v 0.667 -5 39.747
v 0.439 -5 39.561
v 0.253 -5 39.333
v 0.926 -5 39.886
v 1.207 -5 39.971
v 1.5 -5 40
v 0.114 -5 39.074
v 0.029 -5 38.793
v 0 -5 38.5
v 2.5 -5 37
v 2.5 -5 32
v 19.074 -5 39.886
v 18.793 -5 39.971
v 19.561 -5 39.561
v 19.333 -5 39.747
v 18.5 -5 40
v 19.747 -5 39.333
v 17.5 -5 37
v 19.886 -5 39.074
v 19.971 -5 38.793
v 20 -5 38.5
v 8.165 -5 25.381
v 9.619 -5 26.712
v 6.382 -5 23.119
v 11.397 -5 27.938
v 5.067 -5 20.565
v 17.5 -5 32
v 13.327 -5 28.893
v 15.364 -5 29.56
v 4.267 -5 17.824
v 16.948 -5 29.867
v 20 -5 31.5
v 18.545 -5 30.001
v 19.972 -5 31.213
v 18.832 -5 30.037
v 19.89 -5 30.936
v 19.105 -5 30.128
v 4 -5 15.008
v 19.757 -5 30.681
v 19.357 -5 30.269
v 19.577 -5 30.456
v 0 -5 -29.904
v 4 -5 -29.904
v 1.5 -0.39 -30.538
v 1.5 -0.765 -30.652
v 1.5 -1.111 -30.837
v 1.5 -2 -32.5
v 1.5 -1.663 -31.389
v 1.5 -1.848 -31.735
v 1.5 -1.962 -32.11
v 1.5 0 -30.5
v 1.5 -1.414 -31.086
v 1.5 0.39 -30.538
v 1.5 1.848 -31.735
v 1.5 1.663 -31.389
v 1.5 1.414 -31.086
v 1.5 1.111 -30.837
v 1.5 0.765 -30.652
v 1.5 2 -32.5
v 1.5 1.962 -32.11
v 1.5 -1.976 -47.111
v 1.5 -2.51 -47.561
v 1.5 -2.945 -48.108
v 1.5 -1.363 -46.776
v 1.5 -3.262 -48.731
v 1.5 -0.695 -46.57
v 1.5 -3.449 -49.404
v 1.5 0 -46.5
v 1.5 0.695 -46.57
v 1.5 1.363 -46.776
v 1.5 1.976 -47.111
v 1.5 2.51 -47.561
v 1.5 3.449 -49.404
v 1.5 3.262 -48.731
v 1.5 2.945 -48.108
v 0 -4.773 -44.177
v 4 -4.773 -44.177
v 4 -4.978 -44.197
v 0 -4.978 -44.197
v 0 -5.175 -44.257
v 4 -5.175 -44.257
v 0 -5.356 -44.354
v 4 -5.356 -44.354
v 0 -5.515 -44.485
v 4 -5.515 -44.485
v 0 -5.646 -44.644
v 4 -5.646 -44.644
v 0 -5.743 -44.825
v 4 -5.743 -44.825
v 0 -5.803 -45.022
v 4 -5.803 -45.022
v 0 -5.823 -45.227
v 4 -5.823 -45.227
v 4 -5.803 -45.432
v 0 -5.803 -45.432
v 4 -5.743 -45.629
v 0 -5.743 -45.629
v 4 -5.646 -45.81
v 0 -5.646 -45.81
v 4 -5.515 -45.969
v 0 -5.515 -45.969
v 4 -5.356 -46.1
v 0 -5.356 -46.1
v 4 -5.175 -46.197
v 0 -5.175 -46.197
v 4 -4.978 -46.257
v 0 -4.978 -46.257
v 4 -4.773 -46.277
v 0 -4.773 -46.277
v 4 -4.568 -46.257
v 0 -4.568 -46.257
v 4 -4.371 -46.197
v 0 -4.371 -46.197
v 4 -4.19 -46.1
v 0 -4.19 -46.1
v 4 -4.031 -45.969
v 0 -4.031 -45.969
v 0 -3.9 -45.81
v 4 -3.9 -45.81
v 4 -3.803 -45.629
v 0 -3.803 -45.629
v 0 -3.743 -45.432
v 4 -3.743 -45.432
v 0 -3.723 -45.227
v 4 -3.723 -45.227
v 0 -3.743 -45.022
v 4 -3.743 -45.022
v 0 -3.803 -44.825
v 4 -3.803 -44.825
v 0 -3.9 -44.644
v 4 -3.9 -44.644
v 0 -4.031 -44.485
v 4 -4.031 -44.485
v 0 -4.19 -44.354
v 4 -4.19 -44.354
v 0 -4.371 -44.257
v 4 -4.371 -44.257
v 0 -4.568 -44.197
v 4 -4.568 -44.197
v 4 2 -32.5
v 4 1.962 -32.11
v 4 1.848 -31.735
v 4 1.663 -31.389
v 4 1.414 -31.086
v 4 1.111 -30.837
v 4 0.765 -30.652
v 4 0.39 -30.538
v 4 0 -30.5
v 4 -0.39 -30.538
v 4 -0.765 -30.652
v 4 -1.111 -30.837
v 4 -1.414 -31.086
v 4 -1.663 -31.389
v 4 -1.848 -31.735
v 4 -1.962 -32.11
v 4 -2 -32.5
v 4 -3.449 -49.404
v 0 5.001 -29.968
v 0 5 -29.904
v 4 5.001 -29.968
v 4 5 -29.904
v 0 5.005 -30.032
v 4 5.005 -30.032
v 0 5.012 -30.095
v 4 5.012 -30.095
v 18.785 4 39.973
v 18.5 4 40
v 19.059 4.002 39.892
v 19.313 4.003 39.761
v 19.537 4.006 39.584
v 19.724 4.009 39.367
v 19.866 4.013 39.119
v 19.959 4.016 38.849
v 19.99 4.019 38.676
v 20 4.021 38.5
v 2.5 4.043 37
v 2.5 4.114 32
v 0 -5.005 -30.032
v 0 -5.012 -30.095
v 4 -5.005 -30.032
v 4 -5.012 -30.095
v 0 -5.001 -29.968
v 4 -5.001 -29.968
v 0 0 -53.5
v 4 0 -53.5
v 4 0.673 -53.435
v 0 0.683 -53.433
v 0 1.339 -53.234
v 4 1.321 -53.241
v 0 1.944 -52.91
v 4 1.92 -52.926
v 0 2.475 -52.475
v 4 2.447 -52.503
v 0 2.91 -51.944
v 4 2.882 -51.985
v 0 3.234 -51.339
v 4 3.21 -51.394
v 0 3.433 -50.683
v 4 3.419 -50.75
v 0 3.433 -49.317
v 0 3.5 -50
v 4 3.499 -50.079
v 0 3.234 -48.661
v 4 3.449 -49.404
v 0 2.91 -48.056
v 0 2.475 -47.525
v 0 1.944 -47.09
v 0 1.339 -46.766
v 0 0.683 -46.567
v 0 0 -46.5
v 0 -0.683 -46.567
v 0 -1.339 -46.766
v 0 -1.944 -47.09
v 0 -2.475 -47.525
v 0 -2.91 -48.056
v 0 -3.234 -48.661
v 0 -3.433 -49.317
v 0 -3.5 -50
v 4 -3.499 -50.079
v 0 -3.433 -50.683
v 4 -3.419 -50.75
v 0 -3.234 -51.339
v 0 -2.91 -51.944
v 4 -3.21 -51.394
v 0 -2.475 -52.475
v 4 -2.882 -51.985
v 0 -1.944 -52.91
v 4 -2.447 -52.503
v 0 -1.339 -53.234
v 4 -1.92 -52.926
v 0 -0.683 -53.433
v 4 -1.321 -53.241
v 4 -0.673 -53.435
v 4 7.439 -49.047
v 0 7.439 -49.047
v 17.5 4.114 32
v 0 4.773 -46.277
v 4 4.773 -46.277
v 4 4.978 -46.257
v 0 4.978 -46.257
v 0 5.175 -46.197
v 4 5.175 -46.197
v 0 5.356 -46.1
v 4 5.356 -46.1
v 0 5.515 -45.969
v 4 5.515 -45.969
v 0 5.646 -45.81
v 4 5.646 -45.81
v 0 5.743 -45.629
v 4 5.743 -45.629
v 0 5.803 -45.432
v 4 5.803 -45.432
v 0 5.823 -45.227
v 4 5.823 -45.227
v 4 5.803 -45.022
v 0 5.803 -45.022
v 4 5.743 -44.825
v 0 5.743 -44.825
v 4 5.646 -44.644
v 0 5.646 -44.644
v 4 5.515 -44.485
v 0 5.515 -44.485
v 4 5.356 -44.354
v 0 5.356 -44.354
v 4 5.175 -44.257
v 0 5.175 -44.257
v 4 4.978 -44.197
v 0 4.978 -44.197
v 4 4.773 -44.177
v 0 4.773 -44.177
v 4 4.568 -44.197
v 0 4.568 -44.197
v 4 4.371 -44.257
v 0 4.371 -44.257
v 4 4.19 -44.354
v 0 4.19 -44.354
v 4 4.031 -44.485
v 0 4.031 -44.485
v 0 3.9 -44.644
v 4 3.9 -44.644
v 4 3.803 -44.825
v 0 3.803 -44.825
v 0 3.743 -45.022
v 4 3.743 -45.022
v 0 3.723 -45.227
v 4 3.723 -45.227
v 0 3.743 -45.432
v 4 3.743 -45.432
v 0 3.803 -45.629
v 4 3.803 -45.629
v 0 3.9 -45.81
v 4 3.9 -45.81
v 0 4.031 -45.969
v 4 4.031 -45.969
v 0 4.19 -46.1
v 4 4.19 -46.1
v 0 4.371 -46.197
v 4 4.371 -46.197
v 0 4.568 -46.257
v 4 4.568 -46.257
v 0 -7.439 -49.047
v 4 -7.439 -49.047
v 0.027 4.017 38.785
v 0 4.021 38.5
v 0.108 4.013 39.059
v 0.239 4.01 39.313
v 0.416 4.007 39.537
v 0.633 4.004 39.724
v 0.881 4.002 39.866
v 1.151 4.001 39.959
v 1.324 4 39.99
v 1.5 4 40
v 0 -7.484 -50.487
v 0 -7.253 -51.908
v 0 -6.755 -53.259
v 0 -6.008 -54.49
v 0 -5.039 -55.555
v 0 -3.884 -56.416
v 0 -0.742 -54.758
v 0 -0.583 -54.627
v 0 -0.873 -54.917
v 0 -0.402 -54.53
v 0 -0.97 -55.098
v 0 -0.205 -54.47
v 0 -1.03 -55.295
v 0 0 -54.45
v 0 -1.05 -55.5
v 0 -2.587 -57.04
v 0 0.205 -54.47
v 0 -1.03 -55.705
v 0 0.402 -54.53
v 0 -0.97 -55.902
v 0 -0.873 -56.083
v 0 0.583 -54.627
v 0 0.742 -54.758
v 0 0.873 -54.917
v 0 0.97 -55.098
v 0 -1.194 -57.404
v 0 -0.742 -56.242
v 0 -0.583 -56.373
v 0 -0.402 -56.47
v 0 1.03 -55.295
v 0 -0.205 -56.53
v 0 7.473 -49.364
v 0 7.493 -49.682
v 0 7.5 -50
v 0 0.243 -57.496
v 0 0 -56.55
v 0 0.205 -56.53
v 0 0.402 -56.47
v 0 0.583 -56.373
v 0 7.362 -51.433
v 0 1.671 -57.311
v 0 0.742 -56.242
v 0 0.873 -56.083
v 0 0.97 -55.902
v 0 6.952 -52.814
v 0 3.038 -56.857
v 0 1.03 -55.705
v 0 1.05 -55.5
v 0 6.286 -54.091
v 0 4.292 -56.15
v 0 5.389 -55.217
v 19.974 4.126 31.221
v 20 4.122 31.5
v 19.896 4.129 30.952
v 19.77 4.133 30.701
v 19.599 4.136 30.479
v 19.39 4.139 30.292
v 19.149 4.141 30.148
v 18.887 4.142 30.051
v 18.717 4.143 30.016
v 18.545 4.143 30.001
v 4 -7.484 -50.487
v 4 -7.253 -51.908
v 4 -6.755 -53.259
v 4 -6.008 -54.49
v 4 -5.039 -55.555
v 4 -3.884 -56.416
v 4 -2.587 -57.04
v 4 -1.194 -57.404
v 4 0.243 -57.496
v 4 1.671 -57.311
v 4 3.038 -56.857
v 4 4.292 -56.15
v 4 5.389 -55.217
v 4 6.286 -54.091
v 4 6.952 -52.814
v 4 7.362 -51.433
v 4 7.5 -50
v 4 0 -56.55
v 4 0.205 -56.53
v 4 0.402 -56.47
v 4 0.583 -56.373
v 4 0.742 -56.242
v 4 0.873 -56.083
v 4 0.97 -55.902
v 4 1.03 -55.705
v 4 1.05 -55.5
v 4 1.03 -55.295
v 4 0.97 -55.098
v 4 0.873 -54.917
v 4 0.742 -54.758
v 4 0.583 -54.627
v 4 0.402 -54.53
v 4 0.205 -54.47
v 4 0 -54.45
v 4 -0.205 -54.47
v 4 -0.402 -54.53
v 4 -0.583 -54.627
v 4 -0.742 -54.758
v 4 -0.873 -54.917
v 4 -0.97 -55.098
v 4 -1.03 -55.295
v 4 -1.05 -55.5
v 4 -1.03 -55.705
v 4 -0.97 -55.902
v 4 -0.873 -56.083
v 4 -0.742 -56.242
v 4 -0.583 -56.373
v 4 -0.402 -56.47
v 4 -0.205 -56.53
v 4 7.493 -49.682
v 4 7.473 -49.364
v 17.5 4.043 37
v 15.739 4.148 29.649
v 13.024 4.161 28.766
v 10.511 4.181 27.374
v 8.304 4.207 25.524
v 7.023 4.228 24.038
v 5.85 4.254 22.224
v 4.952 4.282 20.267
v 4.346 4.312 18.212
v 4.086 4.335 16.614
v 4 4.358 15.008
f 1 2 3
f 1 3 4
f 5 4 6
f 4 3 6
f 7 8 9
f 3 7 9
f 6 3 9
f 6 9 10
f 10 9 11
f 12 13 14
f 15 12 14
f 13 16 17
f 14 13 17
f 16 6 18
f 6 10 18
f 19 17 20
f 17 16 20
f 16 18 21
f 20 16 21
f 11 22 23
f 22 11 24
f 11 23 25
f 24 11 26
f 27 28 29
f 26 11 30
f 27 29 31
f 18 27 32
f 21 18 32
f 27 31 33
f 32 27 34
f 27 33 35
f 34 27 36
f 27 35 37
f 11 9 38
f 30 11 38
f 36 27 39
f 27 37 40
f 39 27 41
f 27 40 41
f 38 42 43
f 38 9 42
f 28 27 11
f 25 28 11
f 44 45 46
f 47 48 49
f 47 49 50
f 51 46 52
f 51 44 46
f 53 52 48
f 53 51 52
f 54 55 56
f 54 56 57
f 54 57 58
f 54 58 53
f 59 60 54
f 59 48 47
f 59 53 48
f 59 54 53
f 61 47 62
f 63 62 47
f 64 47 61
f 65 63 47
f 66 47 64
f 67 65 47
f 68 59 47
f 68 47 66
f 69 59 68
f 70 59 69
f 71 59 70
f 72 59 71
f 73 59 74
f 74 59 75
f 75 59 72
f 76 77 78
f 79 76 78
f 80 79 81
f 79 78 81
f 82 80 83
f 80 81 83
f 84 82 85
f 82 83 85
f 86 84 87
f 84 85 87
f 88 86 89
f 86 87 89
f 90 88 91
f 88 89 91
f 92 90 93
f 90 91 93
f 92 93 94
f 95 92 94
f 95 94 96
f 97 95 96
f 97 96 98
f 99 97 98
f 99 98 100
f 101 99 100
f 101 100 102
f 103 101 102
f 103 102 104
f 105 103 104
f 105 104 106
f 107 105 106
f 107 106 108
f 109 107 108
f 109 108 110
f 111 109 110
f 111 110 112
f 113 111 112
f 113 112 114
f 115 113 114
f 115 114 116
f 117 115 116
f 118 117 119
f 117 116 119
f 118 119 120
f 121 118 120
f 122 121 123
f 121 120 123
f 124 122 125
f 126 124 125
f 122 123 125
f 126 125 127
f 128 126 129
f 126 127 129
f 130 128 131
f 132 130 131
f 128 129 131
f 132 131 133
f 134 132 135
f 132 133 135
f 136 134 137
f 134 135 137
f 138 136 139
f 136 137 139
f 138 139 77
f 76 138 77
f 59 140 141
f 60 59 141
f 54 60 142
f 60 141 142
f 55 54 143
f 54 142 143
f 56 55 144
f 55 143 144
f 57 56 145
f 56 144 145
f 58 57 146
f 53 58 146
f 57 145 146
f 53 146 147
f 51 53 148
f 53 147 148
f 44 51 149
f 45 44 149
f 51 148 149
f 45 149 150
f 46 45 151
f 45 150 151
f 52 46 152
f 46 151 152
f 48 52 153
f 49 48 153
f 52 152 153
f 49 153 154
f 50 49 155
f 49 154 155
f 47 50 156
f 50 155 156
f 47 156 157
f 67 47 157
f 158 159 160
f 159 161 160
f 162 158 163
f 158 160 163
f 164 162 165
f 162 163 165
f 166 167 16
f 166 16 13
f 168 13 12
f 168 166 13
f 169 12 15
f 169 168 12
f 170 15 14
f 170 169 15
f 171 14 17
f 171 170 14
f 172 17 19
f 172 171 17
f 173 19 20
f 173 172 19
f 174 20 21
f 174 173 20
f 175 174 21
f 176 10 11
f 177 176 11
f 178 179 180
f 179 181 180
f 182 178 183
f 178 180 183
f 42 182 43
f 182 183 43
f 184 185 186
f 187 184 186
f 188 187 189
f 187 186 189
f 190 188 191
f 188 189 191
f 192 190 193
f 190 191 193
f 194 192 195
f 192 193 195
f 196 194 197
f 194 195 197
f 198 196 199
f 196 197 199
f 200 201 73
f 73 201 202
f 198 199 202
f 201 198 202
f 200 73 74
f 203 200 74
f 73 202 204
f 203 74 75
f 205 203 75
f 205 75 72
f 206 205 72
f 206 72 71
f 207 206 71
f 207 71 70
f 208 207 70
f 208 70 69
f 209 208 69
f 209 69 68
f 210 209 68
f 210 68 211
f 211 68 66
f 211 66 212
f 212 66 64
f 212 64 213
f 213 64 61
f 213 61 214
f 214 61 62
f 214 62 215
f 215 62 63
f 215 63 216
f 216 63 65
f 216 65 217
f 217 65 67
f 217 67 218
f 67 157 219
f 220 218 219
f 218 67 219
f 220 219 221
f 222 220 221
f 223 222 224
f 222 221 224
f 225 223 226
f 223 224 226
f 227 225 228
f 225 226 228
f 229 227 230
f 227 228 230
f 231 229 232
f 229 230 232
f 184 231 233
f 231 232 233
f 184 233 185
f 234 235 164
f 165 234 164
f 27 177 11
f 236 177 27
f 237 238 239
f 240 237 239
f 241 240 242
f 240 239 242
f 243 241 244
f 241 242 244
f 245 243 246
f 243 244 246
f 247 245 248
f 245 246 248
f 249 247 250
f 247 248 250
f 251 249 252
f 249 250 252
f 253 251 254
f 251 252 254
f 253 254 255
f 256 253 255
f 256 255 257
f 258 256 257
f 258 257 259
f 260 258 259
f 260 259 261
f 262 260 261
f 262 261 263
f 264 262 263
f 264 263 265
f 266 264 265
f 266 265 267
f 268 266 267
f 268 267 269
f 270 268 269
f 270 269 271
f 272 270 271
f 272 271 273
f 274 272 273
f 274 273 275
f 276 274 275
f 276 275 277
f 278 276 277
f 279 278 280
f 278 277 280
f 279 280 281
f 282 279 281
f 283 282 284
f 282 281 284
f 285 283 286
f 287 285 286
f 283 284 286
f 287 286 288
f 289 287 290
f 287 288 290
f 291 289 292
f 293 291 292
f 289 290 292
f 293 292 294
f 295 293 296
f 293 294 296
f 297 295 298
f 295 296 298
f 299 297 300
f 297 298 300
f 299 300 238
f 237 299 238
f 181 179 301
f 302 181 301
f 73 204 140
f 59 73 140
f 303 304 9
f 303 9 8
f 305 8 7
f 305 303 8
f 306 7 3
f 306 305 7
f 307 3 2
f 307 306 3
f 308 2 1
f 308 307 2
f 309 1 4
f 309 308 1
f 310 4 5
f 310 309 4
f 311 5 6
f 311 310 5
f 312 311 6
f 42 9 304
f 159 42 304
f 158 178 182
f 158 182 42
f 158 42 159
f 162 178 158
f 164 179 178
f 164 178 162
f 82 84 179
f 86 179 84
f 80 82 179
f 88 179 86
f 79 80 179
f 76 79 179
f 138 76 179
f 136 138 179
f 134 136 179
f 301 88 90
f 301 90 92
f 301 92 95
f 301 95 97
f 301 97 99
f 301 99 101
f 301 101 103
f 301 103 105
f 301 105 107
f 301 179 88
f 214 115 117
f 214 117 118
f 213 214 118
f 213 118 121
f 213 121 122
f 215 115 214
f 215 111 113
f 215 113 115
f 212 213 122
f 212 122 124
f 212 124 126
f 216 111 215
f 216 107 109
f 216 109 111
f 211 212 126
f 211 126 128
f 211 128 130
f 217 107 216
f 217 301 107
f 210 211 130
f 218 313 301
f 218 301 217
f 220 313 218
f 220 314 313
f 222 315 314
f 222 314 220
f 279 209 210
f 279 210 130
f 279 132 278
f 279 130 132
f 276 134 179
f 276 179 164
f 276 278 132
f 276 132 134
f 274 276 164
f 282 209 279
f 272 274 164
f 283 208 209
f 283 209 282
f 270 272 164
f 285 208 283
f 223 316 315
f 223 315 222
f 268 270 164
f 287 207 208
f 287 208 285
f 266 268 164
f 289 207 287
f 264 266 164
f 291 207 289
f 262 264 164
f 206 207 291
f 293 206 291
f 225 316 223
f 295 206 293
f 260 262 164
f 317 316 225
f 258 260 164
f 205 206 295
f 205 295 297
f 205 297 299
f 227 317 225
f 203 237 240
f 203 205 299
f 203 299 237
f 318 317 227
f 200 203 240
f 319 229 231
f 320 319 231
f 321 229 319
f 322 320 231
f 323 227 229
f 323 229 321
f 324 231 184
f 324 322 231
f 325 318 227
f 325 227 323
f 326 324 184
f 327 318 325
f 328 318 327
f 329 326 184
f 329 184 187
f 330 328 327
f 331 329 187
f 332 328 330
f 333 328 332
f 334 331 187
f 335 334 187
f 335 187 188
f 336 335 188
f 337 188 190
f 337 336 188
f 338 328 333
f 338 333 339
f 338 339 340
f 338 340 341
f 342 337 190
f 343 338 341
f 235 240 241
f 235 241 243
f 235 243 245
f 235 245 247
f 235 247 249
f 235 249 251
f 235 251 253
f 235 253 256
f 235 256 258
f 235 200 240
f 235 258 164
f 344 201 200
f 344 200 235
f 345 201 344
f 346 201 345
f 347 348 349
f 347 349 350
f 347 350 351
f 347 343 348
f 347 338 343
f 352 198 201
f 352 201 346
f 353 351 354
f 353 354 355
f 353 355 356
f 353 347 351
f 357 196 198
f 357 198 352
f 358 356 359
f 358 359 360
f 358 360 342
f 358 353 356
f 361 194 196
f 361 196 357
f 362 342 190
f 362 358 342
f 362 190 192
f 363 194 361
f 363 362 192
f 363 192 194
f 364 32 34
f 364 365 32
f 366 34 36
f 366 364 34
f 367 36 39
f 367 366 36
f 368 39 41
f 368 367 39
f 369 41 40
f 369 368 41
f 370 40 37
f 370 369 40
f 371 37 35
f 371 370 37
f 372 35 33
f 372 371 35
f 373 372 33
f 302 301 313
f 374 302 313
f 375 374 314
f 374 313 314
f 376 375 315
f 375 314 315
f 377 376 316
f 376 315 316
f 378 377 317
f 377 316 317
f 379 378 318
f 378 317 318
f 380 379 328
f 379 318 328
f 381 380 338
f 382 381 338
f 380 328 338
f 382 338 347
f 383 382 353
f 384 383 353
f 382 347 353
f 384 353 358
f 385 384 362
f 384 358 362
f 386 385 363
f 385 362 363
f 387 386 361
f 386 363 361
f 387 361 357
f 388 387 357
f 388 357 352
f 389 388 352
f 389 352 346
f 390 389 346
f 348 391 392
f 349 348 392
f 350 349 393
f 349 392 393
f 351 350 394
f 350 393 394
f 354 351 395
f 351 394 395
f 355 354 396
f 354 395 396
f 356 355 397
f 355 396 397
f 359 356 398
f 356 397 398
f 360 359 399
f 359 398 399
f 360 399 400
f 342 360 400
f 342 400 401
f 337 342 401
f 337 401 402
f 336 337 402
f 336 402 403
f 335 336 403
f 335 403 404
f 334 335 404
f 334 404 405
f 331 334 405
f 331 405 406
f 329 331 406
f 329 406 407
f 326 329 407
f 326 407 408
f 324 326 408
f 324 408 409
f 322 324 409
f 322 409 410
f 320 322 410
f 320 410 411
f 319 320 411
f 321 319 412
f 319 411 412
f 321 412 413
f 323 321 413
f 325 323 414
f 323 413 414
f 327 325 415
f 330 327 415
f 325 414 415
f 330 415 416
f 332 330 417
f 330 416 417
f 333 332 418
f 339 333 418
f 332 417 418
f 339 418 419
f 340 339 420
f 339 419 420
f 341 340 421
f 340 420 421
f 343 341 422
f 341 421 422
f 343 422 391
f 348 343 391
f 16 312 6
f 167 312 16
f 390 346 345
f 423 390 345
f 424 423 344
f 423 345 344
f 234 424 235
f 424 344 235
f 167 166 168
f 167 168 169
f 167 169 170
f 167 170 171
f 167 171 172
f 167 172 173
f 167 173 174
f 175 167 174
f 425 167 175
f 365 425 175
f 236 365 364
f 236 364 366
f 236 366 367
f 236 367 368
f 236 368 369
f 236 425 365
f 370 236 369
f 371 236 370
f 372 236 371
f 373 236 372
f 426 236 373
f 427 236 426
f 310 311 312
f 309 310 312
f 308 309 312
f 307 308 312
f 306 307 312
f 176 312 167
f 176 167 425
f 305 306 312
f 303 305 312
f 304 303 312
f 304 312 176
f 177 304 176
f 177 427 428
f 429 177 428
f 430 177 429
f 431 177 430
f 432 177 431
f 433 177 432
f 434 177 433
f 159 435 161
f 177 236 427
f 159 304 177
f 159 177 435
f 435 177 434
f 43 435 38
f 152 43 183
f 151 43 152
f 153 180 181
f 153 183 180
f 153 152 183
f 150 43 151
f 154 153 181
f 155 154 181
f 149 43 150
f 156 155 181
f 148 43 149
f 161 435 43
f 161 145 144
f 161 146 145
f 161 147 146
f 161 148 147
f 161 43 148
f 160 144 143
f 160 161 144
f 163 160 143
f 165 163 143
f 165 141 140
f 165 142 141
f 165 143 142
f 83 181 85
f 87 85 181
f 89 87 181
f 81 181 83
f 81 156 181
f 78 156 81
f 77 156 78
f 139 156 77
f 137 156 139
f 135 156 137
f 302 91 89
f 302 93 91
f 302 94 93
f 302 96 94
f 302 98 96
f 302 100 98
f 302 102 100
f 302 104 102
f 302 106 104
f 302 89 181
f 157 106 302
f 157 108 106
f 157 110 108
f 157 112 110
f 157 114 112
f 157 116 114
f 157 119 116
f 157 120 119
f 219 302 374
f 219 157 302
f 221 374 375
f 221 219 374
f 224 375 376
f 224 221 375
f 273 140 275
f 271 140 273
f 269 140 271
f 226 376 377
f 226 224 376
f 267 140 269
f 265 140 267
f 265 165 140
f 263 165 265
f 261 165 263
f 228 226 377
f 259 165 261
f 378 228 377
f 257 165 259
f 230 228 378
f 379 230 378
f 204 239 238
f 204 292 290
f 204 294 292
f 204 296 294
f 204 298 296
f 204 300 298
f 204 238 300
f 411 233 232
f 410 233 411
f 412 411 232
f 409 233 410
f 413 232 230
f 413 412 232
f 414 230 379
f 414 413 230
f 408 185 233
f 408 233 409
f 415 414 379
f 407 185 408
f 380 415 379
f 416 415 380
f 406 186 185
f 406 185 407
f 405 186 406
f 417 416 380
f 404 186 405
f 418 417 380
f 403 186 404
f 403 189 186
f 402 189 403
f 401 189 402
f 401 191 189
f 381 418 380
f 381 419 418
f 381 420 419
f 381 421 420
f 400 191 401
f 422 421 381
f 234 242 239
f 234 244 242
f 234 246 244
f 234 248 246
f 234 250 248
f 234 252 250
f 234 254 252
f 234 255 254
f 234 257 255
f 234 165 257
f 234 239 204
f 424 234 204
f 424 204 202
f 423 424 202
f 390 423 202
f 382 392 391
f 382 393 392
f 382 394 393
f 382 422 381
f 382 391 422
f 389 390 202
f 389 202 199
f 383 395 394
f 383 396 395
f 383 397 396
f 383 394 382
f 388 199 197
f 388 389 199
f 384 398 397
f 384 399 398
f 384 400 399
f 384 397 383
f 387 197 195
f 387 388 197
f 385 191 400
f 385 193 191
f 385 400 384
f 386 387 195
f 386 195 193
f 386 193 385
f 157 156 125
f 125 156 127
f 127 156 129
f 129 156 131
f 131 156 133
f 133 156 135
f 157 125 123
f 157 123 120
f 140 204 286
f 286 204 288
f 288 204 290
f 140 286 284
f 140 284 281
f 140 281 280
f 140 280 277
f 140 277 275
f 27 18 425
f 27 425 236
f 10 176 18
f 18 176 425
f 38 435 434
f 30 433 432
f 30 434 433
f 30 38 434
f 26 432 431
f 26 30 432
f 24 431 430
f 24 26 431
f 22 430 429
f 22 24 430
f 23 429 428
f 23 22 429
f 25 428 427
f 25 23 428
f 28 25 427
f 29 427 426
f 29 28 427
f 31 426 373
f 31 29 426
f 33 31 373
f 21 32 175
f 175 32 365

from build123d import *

# Parameters (mm, degrees)
BOSS_EXTRU_1_DEPTH      = 4
ESQUISSE2_R             = 3.5
ENL_V_MAT_EXTRU_1_DEPTH = 10
ENL_V_MAT_EXTRU_2_DEPTH = 2.5
ESQUISSE5_R             = 1.05
ENL_V_MAT_EXTRU_3_DEPTH = 59.124865591
ESQUISSE6_W             = 20
ESQUISSE6_H             = 10
BOSS_EXTRU_2_DEPTH      = 10
ESQUISSE7_W             = 15
ESQUISSE7_H             = 5
ENL_V_MAT_EXTRU_4_DEPTH = 10
CONG_2_R                = 1.5
CONG_3_R                = 15
ENL_V_START             = -20
ENL_V_MAT_EXTRU_5_DEPTH = 20


# Read off the part's stored shape, not the designer's step: Enlèv. mat.-Extru.5
with BuildPart() as part:
    # Esquisse1 → Boss.-Extru.1 (new body)
    with BuildSketch(Plane(origin=(0, 0, 0), x_dir=(0, 0, -1), z_dir=(1, 0, 0))):
        with BuildLine():
            Line((30, 5), (-30, 5))
            Line((-30, 5), (-30, -5))
            Line((-30, -5), (30, -5))
            Line((30, -5), (49.047311562, -7.439246248))
            ThreePointArc((49.047311562, -7.439246248), (57.484796152, -0.477311816), (50, 7.5))
            ThreePointArc((50, 7.5), (49.522688184, 7.484796152), (49.047311562, 7.439246248))
            Line((49.047311562, 7.439246248), (30, 5))
        make_face()
    extrude(amount=BOSS_EXTRU_1_DEPTH)

    # Esquisse2 → Enlèv. mat.-Extru.1 (cut)
    with BuildSketch(Plane(origin=(4, 0, 0), x_dir=(0, 0, -1), z_dir=(1, 0, 0))):
        with Locations((50, 0)):
            Circle(ESQUISSE2_R)
    extrude(amount=-ENL_V_MAT_EXTRU_1_DEPTH, mode=Mode.SUBTRACT)

    # Esquisse3 → Enlèv. mat.-Extru.2 (cut)
    with BuildSketch(Plane(origin=(4, 0, 0), x_dir=(0, 0, -1), z_dir=(1, 0, 0))):
        with BuildLine():
            Line((49.404376013, 3.448946515), (32.5, 2))
            ThreePointArc((32.5, 2), (30.5, 0), (32.5, -2))
            Line((32.5, -2), (49.404376013, -3.448946515))
            ThreePointArc((49.404376013, -3.448946515), (46.5, 0), (49.404376013, 3.448946515))
        make_face()
    extrude(amount=-ENL_V_MAT_EXTRU_2_DEPTH, mode=Mode.SUBTRACT)

    # Esquisse5 → Enlèv. mat.-Extru.3 (cut, through all)
    with BuildSketch(Plane(origin=(4, 0, 0), x_dir=(0, 0, -1), z_dir=(1, 0, 0))):
        with Locations((55.5, 0)):
            Circle(ESQUISSE5_R)
        with Locations((45.227029227, 4.772970773)):
            Circle(ESQUISSE5_R)
        with Locations(Location((45.227029227, -4.772970773, 0), (0, 0, 180))):
            Circle(ESQUISSE5_R)
    extrude(amount=-ENL_V_MAT_EXTRU_3_DEPTH, mode=Mode.SUBTRACT)

    # Esquisse6 → Boss.-Extru.2 (add)
    with BuildSketch(Plane.XY.offset(30)):
        with Locations((10, 0)):
            Rectangle(ESQUISSE6_W, ESQUISSE6_H)
    extrude(amount=BOSS_EXTRU_2_DEPTH)

    # Esquisse7 → Enlèv. mat.-Extru.4 (cut)
    with BuildSketch(Plane(origin=(0, 5, 0), x_dir=(1, 0, 0), z_dir=(0, 1, 0))):
        with Locations((10, -34.5)):
            Rectangle(ESQUISSE7_W, ESQUISSE7_H)
    extrude(amount=-ENL_V_MAT_EXTRU_4_DEPTH, mode=Mode.SUBTRACT)

    # Congé2
    cong_2_edges = [part.edges().sort_by_distance(p)[0] for p in [
        (2, -5, -30),
        (2, 5, -30),
        (20, 0, 40),
        (0, 0, 40),
        (20, 0, 30),
    ]]
    fillet(cong_2_edges, radius=CONG_2_R)

    # Congé3
    cong_3_edges = [part.edges().sort_by_distance(p)[0] for p in [
        (4, 0, 30),
    ]]
    fillet(cong_3_edges, radius=CONG_3_R)

    # Enlèv. mat.-Extru.5 outline → Enlèv. mat.-Extru.5 (cut)
    with BuildSketch(Plane(origin=(20, 0, 0), x_dir=(0, 0, -1), z_dir=(1, 0, 0)).offset(ENL_V_START)):
        Polygon((-40, 5), (-40, 4), (29.904343724, 5), align=None)
    extrude(amount=ENL_V_MAT_EXTRU_5_DEPTH, mode=Mode.SUBTRACT)


solid = part.part
